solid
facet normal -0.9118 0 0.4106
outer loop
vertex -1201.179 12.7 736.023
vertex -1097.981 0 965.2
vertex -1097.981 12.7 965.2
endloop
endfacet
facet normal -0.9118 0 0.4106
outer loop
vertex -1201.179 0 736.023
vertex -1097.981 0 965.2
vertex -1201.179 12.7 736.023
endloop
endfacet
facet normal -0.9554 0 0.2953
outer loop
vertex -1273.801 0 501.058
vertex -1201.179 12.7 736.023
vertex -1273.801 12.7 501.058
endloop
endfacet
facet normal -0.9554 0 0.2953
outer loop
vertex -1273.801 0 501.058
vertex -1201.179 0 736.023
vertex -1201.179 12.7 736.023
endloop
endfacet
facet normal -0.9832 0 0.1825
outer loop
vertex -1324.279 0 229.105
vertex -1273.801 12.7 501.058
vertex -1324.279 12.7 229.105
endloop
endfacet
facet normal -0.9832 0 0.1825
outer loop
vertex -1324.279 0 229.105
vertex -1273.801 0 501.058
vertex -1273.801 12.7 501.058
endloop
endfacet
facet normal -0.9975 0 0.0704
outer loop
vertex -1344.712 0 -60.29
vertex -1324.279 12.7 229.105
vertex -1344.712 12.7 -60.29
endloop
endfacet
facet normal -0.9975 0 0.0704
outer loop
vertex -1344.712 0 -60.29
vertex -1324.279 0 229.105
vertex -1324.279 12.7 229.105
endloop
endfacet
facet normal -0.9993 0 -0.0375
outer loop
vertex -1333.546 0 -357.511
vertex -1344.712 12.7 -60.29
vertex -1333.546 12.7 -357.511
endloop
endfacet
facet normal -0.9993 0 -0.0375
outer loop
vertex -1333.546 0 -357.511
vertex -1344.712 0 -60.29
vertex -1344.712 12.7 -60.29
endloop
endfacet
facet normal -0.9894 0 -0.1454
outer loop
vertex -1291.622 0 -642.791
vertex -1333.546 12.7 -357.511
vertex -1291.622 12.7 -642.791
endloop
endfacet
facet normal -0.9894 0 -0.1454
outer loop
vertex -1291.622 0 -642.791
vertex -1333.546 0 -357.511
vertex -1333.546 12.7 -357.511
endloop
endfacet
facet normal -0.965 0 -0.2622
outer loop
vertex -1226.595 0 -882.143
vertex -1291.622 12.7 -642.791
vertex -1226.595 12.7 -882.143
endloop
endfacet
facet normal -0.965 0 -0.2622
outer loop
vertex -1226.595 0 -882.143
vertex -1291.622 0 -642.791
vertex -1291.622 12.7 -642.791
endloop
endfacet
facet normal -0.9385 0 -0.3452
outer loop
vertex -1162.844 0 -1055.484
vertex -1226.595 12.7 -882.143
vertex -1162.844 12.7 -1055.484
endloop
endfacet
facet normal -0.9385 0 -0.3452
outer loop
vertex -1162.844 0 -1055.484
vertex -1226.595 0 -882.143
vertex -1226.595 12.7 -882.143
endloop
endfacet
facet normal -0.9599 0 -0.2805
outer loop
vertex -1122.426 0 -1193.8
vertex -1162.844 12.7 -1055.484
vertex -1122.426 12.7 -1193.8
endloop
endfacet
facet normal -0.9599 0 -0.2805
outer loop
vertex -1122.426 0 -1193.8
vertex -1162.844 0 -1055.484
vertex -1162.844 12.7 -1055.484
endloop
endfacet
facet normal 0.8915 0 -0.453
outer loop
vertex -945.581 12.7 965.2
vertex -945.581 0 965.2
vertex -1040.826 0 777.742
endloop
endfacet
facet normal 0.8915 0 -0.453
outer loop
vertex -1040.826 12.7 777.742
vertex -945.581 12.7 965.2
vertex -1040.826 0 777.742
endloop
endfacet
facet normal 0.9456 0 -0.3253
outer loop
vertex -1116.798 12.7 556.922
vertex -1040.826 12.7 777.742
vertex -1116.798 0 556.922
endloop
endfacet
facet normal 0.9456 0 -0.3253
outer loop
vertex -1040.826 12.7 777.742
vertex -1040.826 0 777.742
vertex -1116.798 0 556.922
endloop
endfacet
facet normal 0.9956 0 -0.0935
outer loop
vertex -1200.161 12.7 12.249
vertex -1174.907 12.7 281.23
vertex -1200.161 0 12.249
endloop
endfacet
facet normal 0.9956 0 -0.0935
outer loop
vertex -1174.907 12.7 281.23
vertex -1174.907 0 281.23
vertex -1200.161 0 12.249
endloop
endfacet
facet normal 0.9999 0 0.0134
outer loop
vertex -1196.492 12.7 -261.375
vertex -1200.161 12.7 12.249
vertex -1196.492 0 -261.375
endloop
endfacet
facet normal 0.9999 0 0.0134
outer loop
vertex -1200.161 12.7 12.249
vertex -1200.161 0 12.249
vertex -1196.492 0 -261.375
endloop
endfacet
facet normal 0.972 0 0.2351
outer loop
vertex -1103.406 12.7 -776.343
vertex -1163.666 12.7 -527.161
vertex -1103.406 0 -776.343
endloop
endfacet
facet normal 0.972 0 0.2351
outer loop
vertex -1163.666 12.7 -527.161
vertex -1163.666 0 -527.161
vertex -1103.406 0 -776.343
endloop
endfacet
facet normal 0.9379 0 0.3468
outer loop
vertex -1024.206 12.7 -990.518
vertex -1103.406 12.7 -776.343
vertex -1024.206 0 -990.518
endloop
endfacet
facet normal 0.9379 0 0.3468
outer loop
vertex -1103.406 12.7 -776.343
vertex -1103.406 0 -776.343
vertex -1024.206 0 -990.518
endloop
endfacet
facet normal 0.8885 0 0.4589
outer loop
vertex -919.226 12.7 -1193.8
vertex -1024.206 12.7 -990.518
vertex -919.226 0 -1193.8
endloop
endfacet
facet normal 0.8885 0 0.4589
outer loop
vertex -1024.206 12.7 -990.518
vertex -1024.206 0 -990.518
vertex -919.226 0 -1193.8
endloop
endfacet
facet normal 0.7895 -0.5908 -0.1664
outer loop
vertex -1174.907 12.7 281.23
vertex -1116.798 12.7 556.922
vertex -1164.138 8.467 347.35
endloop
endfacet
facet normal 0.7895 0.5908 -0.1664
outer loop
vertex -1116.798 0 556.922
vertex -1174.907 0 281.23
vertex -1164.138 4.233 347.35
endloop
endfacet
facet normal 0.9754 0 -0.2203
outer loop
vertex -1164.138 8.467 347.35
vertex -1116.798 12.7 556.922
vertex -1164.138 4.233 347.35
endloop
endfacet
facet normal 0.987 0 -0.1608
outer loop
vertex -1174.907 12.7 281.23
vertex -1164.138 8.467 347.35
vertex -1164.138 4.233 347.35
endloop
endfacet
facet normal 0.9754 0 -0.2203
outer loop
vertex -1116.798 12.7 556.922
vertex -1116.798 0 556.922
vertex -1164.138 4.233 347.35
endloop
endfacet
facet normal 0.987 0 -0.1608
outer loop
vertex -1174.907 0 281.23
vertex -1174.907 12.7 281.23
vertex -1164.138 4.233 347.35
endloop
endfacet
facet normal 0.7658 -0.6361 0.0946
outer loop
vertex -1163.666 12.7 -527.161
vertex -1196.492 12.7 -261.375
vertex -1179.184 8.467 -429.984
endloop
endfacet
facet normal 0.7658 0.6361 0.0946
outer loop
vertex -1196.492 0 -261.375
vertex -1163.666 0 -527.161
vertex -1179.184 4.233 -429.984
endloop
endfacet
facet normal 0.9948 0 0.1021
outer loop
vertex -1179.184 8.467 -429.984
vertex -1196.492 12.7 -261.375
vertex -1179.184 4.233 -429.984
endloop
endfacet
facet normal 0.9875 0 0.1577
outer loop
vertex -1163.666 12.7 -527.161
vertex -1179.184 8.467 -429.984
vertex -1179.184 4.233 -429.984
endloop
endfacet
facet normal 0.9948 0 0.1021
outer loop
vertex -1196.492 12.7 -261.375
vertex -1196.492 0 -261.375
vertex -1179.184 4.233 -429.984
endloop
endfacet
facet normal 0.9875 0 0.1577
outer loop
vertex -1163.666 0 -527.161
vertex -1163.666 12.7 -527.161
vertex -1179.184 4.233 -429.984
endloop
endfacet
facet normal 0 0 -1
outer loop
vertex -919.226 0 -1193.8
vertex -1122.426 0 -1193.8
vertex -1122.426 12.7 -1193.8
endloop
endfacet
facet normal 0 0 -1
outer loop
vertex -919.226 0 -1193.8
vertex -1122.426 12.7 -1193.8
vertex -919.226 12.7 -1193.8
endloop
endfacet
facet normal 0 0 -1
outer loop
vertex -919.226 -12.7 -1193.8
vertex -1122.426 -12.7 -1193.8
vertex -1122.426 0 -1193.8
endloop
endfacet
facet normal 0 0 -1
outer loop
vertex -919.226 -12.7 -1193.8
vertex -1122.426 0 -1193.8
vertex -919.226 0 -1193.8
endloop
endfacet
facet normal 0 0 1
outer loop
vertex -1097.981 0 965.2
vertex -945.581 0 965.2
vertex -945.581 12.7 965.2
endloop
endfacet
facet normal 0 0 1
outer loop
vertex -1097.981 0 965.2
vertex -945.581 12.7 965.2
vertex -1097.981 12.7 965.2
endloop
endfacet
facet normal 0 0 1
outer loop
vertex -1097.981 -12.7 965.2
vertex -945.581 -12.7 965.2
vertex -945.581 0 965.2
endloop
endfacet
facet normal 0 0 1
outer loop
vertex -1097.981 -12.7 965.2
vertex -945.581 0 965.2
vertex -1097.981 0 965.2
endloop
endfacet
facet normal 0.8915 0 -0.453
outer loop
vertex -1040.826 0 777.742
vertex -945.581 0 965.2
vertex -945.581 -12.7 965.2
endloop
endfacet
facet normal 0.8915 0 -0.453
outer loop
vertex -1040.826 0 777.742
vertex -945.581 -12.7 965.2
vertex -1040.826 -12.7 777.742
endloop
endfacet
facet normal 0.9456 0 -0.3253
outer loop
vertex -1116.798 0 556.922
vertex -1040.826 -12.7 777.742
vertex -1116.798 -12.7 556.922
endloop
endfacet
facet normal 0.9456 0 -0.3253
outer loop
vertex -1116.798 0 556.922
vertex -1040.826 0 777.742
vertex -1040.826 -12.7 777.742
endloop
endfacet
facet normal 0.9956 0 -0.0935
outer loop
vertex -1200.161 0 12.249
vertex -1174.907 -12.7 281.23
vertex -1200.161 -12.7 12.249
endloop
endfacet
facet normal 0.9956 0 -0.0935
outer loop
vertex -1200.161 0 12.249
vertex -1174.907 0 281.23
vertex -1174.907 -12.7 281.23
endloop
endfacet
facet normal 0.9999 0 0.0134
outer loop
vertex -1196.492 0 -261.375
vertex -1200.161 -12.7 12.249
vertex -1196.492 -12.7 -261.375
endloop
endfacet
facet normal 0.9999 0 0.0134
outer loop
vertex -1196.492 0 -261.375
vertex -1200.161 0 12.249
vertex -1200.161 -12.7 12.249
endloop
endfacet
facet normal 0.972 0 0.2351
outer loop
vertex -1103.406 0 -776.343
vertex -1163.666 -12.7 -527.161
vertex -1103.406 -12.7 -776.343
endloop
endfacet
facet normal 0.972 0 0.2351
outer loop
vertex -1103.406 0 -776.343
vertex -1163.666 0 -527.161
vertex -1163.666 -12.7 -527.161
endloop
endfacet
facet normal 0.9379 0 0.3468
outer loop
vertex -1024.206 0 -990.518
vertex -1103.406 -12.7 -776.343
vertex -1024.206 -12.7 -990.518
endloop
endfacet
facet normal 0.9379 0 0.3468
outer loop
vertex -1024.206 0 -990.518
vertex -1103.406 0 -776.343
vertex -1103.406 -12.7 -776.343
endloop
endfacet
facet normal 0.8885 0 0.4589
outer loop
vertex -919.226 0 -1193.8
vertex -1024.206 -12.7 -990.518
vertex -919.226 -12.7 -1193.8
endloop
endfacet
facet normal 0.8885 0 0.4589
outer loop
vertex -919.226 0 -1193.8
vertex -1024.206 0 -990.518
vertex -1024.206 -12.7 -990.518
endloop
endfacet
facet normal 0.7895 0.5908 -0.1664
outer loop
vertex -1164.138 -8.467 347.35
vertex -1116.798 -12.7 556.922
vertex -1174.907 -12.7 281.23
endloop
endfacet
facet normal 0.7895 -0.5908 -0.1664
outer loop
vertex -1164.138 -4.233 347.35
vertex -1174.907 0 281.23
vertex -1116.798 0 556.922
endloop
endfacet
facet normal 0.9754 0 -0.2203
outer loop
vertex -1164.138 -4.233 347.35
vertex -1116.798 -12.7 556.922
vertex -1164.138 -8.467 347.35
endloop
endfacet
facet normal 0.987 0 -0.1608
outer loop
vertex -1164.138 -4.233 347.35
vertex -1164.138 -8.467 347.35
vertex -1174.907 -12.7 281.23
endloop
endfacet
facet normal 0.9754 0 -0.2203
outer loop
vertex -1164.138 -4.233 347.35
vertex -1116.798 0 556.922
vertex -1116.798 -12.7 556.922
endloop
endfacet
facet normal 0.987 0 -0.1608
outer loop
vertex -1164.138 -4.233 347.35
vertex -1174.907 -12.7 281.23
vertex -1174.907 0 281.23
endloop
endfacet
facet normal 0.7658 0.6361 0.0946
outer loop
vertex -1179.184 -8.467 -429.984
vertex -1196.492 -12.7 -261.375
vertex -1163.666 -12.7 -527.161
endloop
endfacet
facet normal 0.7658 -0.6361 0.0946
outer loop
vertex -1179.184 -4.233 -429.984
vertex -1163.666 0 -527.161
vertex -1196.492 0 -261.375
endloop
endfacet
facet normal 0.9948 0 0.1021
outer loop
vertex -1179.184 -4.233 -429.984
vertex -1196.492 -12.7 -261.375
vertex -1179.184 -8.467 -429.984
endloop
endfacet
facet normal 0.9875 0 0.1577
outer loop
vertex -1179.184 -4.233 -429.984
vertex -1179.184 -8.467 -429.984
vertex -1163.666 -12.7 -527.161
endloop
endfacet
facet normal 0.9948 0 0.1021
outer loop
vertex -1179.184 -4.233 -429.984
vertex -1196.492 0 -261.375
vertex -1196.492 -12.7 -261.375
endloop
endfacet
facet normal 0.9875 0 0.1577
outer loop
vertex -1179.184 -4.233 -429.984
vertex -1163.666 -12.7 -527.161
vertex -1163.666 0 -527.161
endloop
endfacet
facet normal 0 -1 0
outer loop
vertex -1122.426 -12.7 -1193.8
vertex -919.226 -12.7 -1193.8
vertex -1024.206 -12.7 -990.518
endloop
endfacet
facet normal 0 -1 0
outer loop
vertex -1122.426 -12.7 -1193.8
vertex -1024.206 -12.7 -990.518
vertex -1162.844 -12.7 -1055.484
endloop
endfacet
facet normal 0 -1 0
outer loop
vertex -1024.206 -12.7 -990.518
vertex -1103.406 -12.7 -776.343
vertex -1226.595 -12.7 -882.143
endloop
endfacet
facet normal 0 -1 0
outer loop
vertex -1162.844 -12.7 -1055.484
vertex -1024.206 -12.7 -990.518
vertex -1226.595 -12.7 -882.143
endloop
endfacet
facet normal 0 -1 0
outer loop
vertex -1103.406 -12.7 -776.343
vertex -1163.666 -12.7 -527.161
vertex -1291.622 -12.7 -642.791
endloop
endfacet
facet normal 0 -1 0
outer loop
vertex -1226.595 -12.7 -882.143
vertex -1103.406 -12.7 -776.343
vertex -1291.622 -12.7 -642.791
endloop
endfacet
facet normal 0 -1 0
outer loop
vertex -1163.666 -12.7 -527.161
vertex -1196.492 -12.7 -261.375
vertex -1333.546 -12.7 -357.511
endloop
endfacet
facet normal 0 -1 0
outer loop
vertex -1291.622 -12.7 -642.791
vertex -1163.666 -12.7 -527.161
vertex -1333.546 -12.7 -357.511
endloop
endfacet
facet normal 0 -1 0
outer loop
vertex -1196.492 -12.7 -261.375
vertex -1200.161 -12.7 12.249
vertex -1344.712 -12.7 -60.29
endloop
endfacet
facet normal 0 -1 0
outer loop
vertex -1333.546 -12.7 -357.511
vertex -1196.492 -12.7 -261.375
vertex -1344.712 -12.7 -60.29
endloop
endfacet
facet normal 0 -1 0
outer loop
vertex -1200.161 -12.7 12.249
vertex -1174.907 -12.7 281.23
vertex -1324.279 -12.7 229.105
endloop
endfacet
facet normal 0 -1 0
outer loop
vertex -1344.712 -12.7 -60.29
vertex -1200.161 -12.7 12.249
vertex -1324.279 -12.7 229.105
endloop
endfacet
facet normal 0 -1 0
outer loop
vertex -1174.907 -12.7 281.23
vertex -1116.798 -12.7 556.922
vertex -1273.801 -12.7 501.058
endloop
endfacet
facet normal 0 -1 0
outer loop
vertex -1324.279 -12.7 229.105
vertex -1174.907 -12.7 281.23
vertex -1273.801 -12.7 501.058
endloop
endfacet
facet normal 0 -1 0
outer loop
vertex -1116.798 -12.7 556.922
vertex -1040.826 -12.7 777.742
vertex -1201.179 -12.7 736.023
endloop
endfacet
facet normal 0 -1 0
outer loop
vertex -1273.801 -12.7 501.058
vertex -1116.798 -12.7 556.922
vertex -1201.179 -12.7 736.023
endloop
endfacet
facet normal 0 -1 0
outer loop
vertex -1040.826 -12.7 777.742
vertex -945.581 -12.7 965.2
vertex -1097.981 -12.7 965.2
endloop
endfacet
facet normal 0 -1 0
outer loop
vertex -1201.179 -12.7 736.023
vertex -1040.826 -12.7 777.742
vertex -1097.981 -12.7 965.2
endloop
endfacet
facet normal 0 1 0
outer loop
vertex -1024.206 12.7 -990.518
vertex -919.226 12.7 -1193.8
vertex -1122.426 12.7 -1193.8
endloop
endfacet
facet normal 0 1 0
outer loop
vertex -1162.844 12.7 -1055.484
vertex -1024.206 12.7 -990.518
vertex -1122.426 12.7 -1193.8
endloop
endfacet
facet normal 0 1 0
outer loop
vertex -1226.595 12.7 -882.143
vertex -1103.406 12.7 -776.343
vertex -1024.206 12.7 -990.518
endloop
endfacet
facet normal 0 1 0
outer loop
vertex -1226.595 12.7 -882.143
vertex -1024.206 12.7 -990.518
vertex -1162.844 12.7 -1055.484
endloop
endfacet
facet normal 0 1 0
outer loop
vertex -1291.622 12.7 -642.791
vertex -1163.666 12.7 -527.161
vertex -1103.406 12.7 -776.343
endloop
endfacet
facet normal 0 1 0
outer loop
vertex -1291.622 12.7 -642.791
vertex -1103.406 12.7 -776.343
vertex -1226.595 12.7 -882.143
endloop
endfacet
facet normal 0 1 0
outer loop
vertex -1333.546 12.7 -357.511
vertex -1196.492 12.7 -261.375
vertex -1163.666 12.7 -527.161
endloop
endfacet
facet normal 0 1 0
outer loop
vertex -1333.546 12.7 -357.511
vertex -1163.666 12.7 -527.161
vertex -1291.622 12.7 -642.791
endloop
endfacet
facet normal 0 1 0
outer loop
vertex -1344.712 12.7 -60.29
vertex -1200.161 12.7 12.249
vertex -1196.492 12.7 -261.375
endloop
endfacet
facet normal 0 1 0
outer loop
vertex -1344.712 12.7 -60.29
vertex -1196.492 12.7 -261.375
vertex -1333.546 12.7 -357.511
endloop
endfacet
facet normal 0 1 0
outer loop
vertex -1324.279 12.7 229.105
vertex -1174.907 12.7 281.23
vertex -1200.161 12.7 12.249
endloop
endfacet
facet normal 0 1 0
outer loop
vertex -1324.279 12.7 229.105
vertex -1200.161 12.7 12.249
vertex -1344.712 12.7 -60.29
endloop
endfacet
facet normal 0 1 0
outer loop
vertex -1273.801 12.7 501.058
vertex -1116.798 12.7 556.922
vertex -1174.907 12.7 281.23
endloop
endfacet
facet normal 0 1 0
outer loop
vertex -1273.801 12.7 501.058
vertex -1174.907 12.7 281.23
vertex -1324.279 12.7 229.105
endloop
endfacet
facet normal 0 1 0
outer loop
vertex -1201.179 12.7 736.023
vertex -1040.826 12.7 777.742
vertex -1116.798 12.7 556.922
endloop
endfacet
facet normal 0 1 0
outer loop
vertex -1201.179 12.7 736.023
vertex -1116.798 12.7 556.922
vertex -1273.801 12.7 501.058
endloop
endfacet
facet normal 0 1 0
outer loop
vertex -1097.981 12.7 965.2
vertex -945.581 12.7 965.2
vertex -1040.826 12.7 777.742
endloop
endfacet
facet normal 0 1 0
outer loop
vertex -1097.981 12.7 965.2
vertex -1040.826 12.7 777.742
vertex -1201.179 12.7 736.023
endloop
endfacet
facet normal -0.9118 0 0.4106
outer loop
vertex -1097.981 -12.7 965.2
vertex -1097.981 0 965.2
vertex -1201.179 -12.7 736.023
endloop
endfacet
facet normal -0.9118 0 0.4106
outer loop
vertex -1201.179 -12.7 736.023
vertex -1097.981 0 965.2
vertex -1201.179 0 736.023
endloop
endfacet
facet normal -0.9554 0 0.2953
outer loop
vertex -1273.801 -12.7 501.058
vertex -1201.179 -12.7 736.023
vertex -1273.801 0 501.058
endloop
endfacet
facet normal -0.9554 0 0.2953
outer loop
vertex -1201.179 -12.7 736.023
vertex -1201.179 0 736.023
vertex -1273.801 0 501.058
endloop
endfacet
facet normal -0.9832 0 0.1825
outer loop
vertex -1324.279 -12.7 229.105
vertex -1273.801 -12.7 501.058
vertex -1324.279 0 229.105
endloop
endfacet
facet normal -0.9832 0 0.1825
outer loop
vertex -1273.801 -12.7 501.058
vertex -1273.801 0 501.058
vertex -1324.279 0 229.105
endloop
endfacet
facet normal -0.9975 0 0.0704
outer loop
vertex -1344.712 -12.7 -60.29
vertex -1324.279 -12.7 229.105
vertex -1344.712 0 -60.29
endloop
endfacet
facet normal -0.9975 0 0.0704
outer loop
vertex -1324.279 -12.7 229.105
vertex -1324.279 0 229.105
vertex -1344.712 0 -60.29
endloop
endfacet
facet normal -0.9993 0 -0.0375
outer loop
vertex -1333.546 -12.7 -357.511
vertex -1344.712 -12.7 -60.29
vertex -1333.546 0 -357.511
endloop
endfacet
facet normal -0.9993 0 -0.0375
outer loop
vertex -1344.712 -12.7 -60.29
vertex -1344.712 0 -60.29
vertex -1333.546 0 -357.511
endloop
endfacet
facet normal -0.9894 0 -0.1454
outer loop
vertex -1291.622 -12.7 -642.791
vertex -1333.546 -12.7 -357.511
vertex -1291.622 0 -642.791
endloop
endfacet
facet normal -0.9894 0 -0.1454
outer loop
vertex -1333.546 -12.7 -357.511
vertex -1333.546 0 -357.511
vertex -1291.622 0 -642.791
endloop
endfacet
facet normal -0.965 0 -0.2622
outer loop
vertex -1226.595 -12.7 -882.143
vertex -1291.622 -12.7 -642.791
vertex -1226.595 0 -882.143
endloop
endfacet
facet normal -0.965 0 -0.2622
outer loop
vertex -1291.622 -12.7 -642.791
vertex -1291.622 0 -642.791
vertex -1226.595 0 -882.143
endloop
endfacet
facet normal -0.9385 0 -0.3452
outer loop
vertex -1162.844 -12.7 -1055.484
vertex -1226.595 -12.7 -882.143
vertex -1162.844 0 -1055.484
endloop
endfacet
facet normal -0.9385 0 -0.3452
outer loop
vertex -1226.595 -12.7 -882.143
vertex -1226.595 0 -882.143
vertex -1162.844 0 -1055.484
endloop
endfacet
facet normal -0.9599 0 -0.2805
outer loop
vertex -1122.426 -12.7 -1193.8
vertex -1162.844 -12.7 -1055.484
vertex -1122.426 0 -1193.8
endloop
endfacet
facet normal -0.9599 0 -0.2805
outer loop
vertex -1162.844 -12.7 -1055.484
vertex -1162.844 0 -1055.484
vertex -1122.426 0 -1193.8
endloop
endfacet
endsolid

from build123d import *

# Parameters (mm, degrees)
F1_DEPTH = 12.7


with BuildPart() as f1:
    # F0 (on Front) → F1 (new body, symmetric)
    with BuildSketch(Plane.XZ):
        with BuildLine():
            add(Edge.make_bspline(
                [(-945.5808670162, 965.2), (-1242.0630128025, 484.7582280636), (-1340.5170440674, -494.4096505642), (-919.226, -1193.8)],
                knots=[0, 0, 0, 0, 2159.1608506583, 2159.1608506583, 2159.1608506583, 2159.1608506583], degree=3))
            Line((-945.5808670162, 965.2), (-1097.9808670162, 965.2))
            add(Edge.make_bspline(
                [(-1097.9808670162, 965.2), (-1417.2196388245, 366.0375773907), (-1348.5663086676, -720.7227352137), (-1140.6033039093, -1081.5900564194), (-1122.426, -1193.8)],
                knots=[0, 0, 0, 0, 0.6575295809, 1, 1, 1, 1], degree=3))
            Line((-1122.426, -1193.8), (-919.226, -1193.8))
        make_face()
    extrude(amount=F1_DEPTH, both=True)


solid = f1.part
